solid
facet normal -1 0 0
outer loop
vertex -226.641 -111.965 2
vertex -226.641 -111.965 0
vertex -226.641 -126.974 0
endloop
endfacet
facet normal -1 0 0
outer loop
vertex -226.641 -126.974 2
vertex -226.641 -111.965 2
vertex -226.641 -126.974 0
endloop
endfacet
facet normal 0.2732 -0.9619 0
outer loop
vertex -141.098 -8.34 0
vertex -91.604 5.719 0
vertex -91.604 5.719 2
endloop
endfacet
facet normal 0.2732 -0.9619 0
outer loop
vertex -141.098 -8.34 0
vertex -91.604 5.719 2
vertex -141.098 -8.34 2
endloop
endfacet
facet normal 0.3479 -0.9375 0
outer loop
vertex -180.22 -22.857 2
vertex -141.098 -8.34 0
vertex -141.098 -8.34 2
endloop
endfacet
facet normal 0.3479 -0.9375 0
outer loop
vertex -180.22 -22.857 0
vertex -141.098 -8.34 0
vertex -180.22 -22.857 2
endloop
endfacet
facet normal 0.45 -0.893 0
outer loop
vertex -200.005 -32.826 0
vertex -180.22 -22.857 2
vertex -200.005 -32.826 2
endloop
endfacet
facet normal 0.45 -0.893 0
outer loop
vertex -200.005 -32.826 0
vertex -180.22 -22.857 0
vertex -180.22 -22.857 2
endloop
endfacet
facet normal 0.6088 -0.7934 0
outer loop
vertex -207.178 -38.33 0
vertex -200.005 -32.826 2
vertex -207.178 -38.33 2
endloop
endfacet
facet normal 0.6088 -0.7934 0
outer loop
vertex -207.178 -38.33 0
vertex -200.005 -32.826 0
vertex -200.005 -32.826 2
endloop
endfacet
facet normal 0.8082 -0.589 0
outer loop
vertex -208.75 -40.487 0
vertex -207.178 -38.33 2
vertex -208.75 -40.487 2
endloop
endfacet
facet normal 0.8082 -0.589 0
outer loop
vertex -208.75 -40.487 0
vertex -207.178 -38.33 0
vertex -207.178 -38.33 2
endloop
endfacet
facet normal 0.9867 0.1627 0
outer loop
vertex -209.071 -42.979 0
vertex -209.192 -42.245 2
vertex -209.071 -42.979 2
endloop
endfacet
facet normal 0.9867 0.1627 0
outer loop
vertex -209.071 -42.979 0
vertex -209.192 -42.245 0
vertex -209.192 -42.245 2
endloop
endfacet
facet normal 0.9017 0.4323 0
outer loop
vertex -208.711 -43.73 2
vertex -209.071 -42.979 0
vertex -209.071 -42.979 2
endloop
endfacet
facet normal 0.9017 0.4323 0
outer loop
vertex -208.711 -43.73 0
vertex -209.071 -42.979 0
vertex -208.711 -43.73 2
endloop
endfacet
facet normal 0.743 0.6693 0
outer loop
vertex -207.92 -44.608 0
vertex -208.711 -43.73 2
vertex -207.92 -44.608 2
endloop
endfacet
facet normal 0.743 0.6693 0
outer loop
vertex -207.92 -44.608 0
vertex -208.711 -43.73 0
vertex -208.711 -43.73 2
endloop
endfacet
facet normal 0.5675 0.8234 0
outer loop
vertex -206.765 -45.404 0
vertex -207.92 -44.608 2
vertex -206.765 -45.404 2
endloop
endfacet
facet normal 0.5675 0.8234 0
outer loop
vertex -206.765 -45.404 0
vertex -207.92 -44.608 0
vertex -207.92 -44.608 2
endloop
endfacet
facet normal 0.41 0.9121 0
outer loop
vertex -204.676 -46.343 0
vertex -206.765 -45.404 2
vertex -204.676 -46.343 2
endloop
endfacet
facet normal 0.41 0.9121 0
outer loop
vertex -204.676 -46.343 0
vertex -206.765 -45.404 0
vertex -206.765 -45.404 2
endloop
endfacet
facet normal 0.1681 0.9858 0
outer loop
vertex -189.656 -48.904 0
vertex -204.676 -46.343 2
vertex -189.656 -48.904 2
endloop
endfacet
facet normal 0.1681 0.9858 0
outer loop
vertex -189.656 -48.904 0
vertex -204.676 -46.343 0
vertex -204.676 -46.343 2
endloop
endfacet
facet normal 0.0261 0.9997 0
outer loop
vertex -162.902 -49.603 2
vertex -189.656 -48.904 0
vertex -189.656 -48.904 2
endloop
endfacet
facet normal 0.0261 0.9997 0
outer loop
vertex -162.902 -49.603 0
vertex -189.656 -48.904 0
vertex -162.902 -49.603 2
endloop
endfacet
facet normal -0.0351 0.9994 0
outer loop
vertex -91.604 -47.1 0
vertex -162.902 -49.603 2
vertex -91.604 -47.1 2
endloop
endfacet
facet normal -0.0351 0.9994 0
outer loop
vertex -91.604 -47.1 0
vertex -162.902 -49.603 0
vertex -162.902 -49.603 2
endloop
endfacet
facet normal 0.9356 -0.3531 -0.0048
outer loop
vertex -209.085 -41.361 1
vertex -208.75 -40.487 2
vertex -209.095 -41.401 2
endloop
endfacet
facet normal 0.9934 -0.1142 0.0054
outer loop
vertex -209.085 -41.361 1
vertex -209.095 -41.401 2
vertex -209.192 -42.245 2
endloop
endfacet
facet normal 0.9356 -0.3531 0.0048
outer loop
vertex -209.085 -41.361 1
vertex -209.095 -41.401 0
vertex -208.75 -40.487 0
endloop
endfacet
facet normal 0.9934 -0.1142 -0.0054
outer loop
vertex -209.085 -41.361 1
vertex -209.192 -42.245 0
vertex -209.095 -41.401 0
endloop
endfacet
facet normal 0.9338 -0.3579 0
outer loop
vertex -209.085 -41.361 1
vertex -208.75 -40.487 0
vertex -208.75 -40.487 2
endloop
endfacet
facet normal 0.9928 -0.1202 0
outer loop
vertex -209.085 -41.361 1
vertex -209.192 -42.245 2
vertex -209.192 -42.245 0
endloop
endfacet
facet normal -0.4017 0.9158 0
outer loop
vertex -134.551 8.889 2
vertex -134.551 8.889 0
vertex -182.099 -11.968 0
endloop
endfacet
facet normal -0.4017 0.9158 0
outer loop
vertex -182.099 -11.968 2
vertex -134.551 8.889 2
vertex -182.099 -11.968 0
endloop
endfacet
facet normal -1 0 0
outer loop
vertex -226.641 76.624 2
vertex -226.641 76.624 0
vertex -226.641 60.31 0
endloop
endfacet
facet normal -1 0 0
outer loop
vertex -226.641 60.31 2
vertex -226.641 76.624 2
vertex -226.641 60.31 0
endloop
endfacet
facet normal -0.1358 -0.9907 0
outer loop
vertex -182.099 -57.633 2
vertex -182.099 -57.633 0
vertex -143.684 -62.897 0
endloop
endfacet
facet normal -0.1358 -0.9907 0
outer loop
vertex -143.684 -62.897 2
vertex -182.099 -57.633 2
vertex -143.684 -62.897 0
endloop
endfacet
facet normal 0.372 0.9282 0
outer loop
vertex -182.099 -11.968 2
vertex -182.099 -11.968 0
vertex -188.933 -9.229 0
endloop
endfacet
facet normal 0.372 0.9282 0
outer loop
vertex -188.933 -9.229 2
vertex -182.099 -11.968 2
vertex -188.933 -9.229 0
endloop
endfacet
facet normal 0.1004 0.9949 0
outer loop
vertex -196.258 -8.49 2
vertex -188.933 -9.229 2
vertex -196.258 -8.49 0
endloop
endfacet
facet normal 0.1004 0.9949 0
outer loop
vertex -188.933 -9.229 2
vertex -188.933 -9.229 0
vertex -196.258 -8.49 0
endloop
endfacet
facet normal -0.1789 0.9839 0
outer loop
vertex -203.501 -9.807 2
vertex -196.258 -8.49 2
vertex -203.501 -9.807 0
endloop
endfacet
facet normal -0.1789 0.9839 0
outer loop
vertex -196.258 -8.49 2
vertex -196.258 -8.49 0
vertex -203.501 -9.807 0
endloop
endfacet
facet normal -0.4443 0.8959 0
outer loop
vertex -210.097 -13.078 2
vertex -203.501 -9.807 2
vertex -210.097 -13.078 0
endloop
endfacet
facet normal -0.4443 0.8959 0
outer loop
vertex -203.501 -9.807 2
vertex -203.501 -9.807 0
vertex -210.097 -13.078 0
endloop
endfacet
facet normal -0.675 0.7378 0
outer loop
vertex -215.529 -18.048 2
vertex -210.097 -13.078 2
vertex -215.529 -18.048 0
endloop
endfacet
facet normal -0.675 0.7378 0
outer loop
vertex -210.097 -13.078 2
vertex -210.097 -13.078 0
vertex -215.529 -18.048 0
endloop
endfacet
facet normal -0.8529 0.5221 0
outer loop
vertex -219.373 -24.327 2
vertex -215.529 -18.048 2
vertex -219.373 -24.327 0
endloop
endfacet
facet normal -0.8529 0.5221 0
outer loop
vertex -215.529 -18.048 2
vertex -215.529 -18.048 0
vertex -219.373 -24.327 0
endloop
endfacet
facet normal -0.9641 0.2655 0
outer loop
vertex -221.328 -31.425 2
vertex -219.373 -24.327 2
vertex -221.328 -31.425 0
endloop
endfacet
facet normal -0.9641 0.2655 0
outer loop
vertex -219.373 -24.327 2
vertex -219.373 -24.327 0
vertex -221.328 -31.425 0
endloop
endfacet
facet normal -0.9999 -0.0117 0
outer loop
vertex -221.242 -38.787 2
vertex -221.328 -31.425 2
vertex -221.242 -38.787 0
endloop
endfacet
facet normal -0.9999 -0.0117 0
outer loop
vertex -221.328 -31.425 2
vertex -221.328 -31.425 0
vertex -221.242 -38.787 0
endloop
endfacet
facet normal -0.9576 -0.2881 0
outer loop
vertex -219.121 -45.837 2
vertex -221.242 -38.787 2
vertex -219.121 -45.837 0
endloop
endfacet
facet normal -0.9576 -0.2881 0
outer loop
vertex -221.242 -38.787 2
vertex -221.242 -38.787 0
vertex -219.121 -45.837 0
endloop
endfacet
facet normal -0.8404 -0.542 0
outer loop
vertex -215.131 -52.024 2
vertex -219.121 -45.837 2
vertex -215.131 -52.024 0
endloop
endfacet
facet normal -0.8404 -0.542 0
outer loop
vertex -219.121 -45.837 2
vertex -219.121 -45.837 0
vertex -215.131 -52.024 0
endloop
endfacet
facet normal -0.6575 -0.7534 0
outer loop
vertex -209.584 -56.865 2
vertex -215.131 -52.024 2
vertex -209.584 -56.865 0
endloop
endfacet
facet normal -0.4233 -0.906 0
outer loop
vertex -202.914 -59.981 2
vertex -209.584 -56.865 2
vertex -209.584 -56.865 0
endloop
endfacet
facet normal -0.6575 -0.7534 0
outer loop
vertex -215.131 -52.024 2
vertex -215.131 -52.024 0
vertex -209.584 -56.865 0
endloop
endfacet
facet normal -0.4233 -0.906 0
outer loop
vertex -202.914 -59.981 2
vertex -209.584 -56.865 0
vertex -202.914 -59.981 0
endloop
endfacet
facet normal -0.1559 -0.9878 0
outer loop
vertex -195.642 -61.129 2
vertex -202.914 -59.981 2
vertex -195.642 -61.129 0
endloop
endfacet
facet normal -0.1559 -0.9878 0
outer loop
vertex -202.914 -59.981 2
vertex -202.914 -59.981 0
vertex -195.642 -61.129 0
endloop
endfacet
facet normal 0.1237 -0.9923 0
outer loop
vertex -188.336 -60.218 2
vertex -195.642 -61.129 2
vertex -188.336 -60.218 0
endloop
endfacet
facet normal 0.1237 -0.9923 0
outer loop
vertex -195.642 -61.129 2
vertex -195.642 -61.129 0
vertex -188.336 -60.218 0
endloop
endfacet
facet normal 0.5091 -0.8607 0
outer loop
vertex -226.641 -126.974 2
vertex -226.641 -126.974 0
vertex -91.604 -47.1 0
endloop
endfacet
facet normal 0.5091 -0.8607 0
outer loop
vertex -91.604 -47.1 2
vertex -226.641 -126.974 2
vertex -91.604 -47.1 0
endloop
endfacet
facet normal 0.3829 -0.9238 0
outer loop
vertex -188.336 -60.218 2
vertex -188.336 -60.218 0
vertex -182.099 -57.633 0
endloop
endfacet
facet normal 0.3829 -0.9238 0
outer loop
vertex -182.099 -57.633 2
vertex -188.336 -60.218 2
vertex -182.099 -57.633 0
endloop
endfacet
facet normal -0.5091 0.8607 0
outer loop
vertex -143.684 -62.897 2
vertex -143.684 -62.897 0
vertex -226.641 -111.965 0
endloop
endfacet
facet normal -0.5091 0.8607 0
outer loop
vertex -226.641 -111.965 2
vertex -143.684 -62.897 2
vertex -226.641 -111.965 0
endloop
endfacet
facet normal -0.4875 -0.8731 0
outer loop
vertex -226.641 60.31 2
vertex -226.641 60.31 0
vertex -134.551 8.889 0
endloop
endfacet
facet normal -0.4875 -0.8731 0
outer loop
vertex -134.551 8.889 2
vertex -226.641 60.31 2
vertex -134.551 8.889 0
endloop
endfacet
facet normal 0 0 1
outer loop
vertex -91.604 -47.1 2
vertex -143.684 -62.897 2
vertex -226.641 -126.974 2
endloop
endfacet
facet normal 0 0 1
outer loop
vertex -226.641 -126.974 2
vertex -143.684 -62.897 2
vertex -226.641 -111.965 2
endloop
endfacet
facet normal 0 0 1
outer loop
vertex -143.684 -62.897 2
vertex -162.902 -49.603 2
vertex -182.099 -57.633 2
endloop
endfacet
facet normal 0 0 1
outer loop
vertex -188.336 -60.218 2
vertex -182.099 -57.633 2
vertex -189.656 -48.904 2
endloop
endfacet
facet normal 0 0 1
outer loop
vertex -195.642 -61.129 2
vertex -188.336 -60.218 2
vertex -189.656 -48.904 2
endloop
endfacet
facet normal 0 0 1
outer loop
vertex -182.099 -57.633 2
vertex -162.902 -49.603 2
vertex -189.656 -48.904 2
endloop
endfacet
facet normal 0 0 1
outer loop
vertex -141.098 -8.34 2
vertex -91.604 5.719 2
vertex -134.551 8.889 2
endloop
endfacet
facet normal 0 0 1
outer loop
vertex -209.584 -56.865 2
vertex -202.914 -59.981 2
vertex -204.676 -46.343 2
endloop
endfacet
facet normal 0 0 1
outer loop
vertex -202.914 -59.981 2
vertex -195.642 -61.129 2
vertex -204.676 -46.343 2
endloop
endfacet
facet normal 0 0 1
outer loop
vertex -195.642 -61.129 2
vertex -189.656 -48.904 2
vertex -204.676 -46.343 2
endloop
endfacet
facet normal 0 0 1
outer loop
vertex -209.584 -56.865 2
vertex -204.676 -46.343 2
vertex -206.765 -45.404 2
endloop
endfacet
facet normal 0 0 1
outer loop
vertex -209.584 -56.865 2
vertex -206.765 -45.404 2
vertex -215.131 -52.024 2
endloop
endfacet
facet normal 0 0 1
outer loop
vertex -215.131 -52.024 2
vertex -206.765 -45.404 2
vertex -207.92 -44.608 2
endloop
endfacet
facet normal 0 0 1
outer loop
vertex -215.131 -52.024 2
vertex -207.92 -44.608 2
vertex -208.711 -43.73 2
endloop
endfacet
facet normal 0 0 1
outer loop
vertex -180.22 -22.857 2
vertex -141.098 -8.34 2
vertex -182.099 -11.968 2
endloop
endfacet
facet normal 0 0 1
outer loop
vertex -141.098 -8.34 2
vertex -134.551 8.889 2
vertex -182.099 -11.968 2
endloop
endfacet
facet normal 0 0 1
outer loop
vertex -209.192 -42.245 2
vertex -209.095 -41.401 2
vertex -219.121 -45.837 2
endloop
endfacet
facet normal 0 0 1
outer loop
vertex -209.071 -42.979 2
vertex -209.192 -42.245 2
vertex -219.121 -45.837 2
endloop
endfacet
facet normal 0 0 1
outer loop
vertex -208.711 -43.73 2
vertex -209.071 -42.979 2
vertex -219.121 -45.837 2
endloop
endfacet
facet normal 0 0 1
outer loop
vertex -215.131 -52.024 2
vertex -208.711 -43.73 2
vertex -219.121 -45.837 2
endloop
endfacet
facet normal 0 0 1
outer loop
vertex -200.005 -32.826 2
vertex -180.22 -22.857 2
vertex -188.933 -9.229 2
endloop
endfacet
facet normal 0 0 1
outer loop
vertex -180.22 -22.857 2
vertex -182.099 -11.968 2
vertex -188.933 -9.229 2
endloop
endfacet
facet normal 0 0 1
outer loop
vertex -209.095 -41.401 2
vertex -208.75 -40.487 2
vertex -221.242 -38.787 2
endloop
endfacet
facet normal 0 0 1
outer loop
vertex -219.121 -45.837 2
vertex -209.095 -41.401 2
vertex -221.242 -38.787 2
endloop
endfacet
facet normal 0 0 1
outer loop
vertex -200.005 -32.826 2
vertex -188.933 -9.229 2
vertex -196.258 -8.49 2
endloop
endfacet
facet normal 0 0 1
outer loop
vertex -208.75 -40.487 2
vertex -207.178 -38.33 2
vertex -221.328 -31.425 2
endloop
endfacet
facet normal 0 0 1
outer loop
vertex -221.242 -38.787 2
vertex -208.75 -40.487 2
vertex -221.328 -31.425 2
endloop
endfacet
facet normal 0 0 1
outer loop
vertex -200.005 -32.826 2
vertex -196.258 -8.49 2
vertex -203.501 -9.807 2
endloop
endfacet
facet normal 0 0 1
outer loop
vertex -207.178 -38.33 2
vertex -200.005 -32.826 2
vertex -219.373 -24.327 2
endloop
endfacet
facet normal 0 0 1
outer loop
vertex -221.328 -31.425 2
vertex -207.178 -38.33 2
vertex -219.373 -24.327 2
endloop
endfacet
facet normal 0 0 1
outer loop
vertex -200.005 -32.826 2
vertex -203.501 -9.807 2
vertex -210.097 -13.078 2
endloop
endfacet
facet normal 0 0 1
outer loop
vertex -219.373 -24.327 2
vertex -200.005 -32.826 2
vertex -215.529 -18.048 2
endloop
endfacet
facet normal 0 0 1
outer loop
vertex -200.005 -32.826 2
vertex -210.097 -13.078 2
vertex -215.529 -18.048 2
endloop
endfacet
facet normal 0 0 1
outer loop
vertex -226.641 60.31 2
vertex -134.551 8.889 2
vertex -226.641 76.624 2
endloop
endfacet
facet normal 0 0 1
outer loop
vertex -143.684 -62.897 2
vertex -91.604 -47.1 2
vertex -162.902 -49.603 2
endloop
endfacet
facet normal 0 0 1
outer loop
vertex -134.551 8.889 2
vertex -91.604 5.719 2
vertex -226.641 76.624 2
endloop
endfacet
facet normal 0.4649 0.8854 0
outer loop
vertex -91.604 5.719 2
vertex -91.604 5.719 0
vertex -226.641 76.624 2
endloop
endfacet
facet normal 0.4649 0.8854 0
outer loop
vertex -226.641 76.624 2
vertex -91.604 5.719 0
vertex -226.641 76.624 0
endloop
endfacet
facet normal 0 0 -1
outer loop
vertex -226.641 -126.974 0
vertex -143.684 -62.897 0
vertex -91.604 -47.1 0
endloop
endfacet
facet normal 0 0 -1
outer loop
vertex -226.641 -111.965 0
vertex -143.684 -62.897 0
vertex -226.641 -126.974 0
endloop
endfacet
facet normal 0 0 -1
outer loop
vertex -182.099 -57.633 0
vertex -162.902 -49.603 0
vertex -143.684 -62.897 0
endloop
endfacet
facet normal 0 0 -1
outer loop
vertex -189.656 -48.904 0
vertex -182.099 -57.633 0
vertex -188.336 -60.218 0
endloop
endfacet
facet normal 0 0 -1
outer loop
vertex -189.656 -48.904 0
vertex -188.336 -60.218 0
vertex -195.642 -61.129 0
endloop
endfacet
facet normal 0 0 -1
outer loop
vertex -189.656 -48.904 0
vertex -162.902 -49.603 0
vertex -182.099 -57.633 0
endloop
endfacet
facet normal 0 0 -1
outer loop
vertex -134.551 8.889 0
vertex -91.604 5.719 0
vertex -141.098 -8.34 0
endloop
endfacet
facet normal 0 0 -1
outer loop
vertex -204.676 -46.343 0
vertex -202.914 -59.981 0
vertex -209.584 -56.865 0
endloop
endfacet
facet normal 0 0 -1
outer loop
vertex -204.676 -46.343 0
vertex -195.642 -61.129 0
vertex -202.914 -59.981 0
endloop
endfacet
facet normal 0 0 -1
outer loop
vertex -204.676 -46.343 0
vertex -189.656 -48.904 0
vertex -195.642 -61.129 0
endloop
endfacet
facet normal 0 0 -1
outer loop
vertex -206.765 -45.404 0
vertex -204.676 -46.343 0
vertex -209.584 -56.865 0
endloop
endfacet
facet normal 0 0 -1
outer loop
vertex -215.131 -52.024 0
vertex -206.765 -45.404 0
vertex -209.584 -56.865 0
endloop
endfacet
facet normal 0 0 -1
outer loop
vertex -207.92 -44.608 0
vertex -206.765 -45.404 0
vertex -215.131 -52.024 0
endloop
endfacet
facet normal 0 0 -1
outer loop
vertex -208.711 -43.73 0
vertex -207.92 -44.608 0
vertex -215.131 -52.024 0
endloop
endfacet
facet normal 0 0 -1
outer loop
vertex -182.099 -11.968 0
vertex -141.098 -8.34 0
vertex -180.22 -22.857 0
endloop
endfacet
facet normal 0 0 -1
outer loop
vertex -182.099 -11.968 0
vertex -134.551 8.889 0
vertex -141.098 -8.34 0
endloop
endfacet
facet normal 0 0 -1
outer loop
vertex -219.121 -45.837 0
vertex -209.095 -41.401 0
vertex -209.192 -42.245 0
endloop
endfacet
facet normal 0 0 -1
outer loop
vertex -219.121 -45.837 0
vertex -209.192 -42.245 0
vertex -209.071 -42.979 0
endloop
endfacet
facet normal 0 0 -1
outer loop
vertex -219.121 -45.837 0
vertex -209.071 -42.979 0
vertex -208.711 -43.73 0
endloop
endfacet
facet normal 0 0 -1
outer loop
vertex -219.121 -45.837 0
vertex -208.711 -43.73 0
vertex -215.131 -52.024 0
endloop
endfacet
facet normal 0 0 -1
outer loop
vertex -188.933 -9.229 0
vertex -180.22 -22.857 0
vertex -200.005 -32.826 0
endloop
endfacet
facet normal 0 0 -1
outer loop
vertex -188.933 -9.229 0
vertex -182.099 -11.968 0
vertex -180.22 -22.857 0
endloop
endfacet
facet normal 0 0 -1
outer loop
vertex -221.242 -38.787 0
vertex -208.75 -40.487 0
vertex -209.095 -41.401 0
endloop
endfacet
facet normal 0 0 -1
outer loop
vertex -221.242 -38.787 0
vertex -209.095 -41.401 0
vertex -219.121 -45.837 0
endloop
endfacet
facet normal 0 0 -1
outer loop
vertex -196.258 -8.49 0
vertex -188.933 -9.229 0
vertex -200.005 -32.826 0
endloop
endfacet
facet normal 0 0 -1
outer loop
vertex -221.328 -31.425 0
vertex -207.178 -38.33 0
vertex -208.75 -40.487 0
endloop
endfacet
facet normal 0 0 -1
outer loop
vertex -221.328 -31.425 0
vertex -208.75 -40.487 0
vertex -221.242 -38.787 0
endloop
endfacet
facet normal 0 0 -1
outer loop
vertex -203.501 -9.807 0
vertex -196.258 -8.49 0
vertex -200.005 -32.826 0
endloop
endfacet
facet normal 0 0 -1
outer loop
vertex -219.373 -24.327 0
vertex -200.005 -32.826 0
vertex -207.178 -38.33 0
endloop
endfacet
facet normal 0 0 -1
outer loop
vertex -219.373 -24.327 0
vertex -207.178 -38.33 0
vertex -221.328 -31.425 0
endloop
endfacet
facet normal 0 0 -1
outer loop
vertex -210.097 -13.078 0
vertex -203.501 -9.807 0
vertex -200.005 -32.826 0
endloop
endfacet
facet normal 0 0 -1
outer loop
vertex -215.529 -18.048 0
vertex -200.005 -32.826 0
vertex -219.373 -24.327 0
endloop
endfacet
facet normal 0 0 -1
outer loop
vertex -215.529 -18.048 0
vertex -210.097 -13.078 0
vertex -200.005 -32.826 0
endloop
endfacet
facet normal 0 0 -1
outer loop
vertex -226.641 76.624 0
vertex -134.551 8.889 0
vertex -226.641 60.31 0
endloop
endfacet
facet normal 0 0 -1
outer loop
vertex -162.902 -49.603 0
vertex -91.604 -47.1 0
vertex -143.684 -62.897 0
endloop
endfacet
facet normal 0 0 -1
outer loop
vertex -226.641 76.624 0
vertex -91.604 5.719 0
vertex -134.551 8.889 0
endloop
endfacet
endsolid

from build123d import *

# Parameters (mm, degrees)
F1_DEPTH = 2


with BuildPart() as f1:
    # F0 (on Top) → F1 (new body)
    with BuildSketch(Plane.XY):
        with BuildLine():
            add(Edge.make_bspline(
                [(-91.6036099134, 5.71869458), (-154.910440363, -9.9027774504), (-262.0281262764, -54.2071160334), (-157.9037835768, -50.2629770203), (-91.6036099134, -47.1001818306)],
                knots=[0.3313622072, 0.3313622072, 0.3313622072, 0.3313622072, 0.5006095241, 0.683224348, 0.683224348, 0.683224348, 0.683224348], degree=3))
            Line((-91.6036099134, 5.71869458), (-226.6409774689, 76.6244625735))
            Line((-226.6409774689, 76.6244625735), (-226.6409774689, 60.3104606271))
            Line((-226.6409774689, 60.3104606271), (-134.5508992672, 8.8887251914))
            Line((-134.5508992672, 8.8887251914), (-182.0986121893, -11.9680119678))
            ThreePointArc((-182.0986121893, -11.9680119678), (-221.3284847236, -31.4249569037), (-188.3358003152, -60.2179835043))
            Line((-188.3358003152, -60.2179835043), (-182.0986121893, -57.6333925128))
            Line((-182.0986121893, -57.6333925128), (-143.684377288, -62.8968811712))
            Line((-143.684377288, -62.8968811712), (-226.6409774689, -111.9654029608))
            Line((-226.6409774689, -111.9654029608), (-226.6409774689, -126.9742846489))
            Line((-226.6409774689, -126.9742846489), (-91.6036099134, -47.1001818306))
        make_face()
    extrude(amount=F1_DEPTH)


solid = f1.part
